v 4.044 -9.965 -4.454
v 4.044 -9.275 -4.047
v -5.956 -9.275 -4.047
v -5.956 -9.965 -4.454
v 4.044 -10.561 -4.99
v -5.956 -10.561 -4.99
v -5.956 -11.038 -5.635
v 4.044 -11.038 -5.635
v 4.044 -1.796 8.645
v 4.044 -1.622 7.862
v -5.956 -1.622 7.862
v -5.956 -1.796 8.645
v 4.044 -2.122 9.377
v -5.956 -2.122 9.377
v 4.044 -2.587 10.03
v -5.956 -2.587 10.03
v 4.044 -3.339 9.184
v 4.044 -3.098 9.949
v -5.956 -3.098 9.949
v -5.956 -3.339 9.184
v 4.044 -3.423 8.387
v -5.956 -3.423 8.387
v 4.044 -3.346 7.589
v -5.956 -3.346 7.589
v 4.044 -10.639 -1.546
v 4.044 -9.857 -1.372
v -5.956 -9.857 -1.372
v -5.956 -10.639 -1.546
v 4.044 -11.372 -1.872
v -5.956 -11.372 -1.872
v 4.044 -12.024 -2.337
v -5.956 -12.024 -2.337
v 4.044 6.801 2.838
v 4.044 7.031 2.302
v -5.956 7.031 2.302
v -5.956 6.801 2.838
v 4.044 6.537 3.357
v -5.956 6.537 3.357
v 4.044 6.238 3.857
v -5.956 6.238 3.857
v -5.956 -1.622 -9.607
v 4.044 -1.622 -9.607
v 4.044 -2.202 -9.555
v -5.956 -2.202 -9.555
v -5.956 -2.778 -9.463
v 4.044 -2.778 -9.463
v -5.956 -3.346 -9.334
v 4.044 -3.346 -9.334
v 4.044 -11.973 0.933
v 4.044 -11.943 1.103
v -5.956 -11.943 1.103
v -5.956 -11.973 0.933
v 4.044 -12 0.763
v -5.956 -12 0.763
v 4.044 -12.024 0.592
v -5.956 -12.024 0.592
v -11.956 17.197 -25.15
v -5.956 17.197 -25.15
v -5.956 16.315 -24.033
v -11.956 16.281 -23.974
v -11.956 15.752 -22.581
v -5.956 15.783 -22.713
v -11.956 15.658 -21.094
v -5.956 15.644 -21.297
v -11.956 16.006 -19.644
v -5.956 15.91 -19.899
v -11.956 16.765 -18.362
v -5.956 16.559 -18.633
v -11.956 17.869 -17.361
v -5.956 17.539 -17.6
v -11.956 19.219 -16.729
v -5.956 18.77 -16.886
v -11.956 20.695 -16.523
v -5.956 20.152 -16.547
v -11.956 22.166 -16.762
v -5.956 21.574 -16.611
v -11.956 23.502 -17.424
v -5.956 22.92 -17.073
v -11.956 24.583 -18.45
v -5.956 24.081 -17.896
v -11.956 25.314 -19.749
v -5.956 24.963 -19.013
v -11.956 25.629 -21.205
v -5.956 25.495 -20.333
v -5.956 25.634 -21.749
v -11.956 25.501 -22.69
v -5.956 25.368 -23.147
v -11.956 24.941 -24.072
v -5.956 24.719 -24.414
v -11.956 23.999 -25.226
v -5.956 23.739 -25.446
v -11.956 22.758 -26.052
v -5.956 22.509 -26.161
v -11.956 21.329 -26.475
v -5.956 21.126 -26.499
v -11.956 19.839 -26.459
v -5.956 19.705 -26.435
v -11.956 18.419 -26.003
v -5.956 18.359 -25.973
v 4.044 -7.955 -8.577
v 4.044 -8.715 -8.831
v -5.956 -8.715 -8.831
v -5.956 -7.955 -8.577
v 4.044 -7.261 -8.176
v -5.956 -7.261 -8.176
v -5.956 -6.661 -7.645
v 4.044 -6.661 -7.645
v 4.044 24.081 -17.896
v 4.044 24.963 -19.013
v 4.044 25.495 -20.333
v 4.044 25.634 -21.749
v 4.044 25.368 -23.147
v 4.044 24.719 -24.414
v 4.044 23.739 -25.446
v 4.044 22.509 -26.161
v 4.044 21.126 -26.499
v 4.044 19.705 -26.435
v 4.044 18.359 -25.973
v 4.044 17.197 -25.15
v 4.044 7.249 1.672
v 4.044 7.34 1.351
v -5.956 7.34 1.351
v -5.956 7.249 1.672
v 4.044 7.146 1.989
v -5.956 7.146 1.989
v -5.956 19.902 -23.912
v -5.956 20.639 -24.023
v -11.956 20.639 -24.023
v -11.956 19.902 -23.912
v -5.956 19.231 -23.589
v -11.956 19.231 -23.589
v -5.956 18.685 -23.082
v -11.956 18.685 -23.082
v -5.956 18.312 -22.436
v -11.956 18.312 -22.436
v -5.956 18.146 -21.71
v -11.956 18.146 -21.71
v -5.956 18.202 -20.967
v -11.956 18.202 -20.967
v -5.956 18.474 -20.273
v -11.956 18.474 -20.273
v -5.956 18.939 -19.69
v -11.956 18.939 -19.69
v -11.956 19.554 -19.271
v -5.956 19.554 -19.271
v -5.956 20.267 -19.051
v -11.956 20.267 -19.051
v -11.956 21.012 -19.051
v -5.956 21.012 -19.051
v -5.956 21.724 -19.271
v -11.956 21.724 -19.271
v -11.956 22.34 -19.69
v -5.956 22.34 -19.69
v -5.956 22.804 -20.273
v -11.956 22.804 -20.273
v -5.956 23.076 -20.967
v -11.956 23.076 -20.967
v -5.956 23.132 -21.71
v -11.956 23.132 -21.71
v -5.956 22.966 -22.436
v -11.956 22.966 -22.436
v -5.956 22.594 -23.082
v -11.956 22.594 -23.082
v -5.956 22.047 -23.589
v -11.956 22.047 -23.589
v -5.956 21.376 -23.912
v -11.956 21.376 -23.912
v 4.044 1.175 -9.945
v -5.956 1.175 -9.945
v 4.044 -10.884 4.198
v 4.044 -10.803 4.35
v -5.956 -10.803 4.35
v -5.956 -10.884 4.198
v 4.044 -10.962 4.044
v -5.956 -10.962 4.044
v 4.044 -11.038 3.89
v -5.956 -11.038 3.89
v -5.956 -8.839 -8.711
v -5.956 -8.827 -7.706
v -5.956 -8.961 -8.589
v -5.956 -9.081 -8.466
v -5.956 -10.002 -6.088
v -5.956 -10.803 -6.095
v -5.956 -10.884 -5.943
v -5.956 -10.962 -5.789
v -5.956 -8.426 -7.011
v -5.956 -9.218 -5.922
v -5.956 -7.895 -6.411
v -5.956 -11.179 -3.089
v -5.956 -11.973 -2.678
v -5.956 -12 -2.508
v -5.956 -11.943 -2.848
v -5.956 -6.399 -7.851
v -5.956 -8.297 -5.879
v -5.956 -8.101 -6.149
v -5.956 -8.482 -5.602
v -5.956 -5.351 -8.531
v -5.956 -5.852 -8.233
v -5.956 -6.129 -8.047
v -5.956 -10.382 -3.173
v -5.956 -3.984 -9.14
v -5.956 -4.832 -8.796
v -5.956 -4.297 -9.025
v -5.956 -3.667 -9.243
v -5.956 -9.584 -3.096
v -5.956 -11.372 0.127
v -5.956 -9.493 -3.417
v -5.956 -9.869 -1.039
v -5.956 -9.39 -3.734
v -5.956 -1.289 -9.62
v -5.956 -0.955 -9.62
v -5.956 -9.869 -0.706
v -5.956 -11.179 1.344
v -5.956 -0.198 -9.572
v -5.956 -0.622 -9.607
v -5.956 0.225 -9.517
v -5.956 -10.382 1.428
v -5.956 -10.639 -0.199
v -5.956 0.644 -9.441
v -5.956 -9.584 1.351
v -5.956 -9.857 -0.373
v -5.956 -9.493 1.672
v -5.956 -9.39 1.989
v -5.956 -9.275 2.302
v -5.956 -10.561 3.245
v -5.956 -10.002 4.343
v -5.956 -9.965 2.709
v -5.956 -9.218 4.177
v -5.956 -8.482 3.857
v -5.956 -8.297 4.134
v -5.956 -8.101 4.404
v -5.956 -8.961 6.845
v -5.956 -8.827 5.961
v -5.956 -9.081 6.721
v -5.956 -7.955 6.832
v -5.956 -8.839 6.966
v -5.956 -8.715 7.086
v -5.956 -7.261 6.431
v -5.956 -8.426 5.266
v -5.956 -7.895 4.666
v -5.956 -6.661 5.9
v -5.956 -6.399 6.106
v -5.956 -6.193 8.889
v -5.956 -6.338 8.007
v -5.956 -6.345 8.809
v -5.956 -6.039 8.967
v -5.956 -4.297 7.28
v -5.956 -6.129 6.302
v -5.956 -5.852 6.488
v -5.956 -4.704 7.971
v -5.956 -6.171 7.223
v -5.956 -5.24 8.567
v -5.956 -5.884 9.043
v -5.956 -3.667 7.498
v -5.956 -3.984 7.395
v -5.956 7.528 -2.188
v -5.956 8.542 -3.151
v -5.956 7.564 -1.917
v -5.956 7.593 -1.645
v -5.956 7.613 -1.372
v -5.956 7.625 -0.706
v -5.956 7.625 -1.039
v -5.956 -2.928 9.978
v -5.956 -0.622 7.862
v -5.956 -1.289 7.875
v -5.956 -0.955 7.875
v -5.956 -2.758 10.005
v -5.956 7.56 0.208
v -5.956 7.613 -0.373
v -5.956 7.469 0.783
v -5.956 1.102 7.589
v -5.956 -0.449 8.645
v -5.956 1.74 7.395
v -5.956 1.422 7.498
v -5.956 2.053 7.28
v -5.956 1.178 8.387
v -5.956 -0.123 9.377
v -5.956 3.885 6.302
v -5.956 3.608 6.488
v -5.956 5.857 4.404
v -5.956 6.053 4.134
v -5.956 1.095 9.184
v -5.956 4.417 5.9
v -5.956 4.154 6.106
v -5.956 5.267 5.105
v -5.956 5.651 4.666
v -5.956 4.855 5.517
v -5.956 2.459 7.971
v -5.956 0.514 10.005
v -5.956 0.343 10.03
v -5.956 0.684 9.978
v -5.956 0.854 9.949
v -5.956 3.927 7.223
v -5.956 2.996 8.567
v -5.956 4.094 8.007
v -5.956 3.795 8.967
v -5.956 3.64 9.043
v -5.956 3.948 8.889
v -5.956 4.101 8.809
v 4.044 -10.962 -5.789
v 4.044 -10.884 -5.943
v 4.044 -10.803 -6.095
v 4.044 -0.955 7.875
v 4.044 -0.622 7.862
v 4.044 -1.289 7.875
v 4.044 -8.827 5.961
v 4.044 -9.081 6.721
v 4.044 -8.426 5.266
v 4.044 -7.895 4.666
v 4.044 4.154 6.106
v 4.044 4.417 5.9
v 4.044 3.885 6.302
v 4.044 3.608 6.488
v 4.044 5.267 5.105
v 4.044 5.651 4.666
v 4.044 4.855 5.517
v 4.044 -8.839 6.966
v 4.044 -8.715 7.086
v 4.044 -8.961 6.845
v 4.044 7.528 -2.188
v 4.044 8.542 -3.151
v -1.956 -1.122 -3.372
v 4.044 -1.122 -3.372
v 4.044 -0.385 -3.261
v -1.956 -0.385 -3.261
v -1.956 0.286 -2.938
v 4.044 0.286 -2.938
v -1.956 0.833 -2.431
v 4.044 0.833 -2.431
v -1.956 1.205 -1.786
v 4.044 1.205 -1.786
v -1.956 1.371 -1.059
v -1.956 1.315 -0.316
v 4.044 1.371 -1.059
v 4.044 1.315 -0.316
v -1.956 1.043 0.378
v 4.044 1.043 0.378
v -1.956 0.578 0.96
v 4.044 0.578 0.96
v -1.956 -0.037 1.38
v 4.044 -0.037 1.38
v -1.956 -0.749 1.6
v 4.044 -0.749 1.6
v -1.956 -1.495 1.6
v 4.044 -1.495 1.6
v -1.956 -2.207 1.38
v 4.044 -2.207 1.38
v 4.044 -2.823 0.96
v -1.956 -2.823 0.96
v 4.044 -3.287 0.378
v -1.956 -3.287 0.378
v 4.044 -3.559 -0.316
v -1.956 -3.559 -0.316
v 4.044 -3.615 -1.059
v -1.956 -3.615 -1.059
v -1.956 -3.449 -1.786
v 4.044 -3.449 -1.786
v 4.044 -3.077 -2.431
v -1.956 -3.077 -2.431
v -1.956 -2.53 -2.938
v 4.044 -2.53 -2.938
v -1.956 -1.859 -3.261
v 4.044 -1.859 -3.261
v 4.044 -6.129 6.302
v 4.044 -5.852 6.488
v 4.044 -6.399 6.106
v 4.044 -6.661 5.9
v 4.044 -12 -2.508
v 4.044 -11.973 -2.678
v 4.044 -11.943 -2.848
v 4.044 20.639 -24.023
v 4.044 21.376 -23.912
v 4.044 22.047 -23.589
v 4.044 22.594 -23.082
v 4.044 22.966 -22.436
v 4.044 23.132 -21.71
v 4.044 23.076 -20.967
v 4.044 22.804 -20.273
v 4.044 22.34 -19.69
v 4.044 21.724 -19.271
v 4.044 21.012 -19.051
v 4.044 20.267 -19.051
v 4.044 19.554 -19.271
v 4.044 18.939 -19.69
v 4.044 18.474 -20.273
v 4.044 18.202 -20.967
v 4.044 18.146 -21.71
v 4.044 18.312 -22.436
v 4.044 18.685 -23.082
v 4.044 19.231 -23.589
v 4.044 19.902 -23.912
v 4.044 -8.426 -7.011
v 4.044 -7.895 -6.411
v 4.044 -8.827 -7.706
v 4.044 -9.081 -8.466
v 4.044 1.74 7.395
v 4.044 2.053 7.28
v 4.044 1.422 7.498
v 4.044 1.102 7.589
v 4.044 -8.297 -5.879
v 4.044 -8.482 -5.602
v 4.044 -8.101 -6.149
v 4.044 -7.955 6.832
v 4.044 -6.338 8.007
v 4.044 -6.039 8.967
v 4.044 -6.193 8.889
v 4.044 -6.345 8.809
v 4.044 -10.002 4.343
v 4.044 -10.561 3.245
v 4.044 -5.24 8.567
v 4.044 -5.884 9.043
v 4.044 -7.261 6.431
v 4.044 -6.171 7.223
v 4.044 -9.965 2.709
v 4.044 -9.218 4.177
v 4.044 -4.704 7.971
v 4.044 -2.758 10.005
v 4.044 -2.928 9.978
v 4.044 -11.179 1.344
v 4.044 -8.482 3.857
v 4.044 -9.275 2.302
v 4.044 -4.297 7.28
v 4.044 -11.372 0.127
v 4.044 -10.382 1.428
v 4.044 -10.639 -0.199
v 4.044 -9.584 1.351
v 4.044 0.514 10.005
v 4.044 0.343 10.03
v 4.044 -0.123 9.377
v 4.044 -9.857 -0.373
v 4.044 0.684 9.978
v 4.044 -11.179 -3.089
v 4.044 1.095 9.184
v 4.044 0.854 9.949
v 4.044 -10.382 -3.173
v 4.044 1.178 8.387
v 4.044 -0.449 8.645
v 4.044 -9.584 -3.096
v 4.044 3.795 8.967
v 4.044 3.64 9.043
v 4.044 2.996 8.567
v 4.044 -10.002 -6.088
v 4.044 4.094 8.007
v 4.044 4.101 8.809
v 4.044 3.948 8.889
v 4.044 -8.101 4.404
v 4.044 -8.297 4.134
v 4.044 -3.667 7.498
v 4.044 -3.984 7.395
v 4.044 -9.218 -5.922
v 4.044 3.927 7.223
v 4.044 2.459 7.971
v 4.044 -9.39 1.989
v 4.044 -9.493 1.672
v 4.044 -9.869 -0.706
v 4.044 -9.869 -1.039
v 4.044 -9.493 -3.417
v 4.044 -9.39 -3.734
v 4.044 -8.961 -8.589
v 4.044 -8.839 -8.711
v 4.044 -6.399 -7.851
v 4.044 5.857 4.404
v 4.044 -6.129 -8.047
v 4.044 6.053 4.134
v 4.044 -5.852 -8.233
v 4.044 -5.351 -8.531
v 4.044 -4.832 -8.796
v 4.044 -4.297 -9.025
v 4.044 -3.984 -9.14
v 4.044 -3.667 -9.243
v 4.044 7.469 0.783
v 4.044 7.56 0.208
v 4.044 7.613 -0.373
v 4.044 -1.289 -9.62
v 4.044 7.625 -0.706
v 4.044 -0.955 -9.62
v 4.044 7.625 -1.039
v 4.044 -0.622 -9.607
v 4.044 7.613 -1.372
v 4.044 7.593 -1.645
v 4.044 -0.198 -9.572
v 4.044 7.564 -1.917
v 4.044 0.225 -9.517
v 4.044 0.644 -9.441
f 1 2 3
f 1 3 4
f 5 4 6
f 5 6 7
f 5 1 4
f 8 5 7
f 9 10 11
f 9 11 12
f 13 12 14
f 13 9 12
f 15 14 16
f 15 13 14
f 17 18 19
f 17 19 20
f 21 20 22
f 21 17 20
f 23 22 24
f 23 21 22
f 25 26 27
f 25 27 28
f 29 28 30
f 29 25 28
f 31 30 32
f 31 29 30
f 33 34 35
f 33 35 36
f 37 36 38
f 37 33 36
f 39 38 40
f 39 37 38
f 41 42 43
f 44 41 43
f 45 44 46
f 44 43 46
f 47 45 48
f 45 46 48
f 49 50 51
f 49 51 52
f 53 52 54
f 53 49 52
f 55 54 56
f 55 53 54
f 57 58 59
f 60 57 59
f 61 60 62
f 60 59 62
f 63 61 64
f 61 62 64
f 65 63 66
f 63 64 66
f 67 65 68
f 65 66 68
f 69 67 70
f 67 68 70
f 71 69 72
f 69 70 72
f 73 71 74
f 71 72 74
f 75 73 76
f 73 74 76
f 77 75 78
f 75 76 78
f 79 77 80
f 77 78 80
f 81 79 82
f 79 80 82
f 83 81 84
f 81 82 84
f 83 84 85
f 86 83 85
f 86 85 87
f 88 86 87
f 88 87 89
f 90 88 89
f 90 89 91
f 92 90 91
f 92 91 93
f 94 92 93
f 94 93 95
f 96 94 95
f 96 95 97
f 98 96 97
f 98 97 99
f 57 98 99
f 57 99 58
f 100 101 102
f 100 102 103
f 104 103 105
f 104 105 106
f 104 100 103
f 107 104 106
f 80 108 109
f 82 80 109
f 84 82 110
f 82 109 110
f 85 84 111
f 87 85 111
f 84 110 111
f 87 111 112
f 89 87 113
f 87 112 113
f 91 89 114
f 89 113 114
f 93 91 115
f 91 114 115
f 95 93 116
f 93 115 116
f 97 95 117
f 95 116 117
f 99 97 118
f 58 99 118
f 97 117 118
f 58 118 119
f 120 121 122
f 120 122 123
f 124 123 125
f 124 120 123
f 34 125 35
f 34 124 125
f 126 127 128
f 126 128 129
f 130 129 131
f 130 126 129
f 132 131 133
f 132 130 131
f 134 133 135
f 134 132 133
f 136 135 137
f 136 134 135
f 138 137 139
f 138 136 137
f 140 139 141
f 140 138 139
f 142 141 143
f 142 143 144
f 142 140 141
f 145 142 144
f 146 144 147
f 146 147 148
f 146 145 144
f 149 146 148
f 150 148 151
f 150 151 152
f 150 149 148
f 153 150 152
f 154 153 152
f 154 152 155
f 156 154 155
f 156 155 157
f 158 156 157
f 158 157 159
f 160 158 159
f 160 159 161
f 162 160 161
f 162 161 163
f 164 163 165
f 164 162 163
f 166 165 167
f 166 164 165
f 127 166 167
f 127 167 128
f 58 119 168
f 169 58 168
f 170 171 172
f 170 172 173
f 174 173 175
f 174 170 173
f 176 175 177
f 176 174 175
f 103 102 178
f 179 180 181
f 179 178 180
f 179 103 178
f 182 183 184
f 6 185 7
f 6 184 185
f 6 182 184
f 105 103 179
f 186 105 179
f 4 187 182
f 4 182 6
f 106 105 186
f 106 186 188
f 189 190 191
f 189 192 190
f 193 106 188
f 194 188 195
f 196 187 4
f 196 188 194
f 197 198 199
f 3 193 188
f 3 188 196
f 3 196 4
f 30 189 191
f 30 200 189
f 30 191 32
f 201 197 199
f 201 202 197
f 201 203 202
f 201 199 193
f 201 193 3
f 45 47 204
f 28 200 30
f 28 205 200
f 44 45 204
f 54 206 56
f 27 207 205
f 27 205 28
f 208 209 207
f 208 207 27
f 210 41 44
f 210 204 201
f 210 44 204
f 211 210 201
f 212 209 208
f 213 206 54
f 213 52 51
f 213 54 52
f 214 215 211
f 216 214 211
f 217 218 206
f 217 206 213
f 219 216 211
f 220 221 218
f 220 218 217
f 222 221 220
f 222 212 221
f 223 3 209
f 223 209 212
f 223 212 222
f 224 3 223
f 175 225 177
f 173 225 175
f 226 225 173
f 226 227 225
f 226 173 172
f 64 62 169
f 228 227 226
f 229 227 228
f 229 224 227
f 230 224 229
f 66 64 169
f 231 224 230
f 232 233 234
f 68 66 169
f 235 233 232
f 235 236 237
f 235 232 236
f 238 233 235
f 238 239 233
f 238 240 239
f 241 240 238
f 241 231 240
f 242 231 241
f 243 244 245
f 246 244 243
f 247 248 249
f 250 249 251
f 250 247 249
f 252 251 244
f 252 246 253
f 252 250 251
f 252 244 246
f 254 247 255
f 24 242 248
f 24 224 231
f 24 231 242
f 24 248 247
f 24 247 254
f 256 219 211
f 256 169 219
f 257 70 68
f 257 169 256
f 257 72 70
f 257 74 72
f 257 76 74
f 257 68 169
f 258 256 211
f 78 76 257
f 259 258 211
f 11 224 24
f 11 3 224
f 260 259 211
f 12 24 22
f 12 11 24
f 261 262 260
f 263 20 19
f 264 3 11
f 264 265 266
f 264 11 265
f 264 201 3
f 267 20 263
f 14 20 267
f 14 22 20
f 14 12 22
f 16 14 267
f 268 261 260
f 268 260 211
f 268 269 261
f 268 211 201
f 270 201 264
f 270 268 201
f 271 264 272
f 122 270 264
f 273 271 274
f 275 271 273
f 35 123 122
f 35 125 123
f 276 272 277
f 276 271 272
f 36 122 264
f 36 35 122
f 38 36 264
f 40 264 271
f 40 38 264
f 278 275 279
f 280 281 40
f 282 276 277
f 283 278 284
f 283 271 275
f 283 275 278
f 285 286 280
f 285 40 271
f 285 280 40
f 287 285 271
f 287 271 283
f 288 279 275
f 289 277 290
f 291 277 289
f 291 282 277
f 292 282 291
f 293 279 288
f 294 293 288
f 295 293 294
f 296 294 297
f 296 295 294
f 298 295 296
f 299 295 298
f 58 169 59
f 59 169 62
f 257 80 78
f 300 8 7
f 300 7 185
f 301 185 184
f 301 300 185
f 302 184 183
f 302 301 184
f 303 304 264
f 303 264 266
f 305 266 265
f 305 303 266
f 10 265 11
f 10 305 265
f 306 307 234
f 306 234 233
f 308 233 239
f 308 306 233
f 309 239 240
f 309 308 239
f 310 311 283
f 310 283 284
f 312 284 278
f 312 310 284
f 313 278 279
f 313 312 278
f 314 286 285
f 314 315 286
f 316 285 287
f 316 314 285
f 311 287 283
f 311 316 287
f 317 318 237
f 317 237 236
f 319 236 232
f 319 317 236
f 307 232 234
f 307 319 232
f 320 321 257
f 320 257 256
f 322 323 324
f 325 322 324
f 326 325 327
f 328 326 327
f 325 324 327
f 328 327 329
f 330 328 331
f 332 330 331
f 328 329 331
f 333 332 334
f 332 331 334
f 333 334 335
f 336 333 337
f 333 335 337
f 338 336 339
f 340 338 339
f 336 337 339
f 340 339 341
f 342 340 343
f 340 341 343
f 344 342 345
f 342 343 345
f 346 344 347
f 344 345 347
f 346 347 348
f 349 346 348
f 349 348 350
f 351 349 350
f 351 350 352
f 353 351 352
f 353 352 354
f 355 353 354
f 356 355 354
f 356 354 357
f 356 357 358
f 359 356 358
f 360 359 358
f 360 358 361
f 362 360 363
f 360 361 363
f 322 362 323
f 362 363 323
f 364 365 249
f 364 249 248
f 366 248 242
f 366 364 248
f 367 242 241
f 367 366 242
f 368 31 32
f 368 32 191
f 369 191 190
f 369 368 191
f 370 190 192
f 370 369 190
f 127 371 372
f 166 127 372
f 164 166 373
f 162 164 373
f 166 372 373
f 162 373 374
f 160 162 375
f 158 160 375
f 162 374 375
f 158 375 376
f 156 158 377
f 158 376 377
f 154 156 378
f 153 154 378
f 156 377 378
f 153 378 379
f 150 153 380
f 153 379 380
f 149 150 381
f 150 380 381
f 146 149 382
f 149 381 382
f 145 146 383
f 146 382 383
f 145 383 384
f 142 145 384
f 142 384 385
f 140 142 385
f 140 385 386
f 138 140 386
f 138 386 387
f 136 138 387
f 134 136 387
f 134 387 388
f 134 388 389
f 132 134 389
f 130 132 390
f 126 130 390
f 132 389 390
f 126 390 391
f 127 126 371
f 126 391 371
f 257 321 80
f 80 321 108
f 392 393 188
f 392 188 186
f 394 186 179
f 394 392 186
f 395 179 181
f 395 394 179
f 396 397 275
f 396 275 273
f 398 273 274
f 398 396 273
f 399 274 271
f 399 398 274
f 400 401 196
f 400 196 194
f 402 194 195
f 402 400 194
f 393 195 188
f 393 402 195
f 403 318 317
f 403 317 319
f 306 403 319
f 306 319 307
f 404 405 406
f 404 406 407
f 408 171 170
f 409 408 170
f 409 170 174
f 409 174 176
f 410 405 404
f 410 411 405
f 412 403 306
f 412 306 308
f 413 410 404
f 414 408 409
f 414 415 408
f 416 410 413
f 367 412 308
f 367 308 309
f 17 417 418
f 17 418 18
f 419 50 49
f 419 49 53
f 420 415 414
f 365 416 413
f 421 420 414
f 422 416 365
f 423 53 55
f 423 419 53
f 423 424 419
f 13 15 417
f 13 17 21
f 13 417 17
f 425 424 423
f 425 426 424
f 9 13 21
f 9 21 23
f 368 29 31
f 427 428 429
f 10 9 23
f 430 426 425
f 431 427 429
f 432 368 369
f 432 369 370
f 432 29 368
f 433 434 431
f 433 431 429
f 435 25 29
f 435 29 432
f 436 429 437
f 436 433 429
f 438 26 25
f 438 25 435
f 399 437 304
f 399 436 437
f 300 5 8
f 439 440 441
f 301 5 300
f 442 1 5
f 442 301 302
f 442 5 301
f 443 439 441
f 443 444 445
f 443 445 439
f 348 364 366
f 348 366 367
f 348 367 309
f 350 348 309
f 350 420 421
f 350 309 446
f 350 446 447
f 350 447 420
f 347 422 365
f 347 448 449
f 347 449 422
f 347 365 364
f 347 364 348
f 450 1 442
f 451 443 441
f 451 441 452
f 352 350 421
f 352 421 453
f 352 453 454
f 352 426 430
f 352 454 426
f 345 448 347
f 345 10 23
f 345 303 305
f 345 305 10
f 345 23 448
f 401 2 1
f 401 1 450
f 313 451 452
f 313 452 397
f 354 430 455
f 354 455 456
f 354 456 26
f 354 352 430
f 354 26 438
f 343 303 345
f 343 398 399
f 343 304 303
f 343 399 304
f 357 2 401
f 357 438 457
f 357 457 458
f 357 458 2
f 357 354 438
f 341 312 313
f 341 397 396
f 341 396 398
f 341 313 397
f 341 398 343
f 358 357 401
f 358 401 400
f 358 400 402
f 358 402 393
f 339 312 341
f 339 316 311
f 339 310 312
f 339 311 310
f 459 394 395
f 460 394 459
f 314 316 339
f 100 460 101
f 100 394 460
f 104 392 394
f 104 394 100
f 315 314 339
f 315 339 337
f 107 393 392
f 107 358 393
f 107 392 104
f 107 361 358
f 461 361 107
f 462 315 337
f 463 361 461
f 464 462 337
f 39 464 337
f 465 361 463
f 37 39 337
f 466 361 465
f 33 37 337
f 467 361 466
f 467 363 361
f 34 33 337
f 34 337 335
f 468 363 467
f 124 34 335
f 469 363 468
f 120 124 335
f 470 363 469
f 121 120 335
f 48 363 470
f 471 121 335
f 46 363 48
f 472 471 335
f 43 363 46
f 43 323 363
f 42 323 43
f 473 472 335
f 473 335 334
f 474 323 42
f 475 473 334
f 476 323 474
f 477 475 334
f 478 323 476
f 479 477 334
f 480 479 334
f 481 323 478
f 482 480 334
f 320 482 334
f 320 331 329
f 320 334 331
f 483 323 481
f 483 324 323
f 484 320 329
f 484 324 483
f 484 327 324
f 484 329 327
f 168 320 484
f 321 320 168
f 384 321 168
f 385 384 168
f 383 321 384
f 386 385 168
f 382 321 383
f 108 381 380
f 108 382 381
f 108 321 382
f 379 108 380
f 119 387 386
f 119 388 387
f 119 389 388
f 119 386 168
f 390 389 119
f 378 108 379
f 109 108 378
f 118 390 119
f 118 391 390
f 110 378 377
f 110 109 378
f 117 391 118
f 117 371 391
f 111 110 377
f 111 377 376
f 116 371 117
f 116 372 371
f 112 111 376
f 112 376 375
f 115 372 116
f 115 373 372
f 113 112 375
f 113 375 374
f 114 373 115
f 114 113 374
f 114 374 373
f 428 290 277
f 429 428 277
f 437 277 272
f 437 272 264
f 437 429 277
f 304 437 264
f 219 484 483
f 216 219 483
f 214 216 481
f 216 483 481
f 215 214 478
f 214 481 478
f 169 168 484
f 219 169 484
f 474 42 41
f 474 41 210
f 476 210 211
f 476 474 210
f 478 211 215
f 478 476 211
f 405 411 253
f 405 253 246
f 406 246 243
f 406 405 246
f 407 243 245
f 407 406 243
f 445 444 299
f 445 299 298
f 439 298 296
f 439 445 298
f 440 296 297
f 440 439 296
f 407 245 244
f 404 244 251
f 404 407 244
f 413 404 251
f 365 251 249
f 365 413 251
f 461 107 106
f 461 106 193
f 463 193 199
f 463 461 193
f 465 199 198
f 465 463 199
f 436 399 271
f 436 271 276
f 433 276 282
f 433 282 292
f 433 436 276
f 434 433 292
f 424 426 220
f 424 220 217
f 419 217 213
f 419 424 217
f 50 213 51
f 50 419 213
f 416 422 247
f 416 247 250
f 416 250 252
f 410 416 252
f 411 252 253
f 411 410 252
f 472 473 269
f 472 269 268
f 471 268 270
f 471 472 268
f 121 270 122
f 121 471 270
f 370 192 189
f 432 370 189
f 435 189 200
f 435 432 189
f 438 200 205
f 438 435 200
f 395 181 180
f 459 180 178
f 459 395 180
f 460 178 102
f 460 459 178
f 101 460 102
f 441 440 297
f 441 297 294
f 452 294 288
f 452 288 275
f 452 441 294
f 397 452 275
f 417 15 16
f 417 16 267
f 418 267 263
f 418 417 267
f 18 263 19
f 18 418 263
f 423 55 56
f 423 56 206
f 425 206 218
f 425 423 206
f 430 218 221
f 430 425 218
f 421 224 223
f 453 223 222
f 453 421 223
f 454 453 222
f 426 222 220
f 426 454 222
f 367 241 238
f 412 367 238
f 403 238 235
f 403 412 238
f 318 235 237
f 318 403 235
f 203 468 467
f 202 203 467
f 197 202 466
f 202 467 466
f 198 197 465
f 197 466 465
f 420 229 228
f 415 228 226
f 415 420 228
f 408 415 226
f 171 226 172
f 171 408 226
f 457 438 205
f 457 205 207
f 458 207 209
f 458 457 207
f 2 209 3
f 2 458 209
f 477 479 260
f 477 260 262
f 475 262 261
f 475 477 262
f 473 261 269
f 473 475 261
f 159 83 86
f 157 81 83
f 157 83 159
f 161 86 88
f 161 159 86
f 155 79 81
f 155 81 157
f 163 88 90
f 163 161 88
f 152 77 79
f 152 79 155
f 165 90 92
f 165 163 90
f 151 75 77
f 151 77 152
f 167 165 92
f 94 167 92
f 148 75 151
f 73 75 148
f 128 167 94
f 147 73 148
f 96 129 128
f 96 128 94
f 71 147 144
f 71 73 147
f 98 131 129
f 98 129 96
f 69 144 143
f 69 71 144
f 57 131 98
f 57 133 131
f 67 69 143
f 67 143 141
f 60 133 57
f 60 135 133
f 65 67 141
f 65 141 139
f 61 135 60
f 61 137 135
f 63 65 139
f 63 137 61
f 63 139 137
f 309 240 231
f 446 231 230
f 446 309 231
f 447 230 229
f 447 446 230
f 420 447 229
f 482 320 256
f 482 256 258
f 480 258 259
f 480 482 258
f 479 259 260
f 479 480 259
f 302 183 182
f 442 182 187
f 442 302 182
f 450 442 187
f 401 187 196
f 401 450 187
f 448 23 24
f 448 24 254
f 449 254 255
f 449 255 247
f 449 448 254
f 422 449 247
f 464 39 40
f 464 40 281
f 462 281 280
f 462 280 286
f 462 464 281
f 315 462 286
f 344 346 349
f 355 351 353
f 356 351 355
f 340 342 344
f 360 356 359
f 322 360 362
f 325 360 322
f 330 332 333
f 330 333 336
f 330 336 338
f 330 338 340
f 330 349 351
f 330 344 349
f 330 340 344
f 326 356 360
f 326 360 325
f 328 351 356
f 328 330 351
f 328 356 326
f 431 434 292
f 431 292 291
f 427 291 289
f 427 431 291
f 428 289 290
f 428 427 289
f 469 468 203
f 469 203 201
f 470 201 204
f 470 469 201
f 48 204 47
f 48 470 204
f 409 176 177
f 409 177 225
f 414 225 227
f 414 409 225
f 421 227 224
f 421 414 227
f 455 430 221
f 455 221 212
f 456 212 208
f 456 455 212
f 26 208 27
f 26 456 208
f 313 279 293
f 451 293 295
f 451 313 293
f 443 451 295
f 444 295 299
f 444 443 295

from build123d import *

# Parameters (mm, degrees)
SKETCH1_R           = 2.5
BOSS_EXTRUDE1_DEPTH = 10
SKETCH2_R           = 2.5
BOSS_EXTRUDE2_DEPTH = 10
SKETCH3_R           = 5
SKETCH3_R_2         = 2.5
BOSS_EXTRUDE3_DEPTH = 6
SKETCH4_R           = 2.5
CUT_EXTRUDE1_DEPTH  = 6
CUT_EXTRUDE2_DEPTH  = 41.209967862


with BuildPart() as part:
    # Sketch1 → Boss-Extrude1 (new body)
    with BuildSketch(Plane(origin=(4.043870029, 0, 0), x_dir=(0, 0, -1), z_dir=(1, 0, 0))):
        with BuildLine():
            ThreePointArc((-10.029541992, 0.342879069), (-9.019080639, -0.304016541), (-7.862233613, -0.622153359))
            ThreePointArc((-7.862233613, -0.622153359), (-7.876528296, -1.122077366), (-7.862233613, -1.622001374))
            ThreePointArc((-7.862233613, -1.622001374), (-9.019080639, -1.940138191), (-10.029541992, -2.587033801))
            ThreePointArc((-10.029541992, -2.587033801), (-9.992100042, -2.842856482), (-9.948655897, -3.097728508))
            ThreePointArc((-9.948655897, -3.097728508), (-8.787748306, -3.400713063), (-7.58921172, -3.345793765))
            ThreePointArc((-7.58921172, -3.345793765), (-7.448321757, -3.82566705), (-7.280241692, -4.296705735))
            ThreePointArc((-7.280241692, -4.296705735), (-8.282158911, -4.956757219), (-9.043263028, -5.884241235))
            ThreePointArc((-9.043263028, -5.884241235), (-8.928600062, -6.115972863), (-8.808522437, -6.344945585))
            ThreePointArc((-8.808522437, -6.344945585), (-7.610806331, -6.274360846), (-6.487901298, -5.851761317))
            ThreePointArc((-6.487901298, -5.851761317), (-6.20561798, -6.264610538), (-5.90020538, -6.660655353))
            ThreePointArc((-5.90020538, -6.660655353), (-6.649118154, -7.598011066), (-7.086362862, -8.715294889))
            ThreePointArc((-7.086362862, -8.715294889), (-6.905702889, -8.900251959), (-6.720745819, -9.080911932))
            ThreePointArc((-6.720745819, -9.080911932), (-5.603461996, -8.643667224), (-4.666106283, -7.89475445))
            ThreePointArc((-4.666106283, -7.89475445), (-4.270061468, -8.20016705), (-3.857212247, -8.482450368))
            ThreePointArc((-3.857212247, -8.482450368), (-4.279811776, -9.605355401), (-4.350396515, -10.803071507))
            ThreePointArc((-4.350396515, -10.803071507), (-4.121423793, -10.923149132), (-3.889692165, -11.037812099))
            ThreePointArc((-3.889692165, -11.037812099), (-2.962208149, -10.276707981), (-2.302156665, -9.274790762))
            ThreePointArc((-2.302156665, -9.274790762), (-1.83111798, -9.442870827), (-1.351244695, -9.583760791))
            ThreePointArc((-1.351244695, -9.583760791), (-1.406163992, -10.782297376), (-1.103179437, -11.943204968))
            ThreePointArc((-1.103179437, -11.943204968), (-0.848307411, -11.986649113), (-0.592484731, -12.024091063))
            ThreePointArc((-0.592484731, -12.024091063), (0.054410879, -11.01362971), (0.372547697, -9.856782684))
            ThreePointArc((0.372547697, -9.856782684), (0.872471704, -9.871077366), (1.372395712, -9.856782684))
            ThreePointArc((1.372395712, -9.856782684), (1.690532529, -11.01362971), (2.337428139, -12.024091063))
            ThreePointArc((2.337428139, -12.024091063), (2.59325082, -11.986649113), (2.848122846, -11.943204968))
            ThreePointArc((2.848122846, -11.943204968), (3.151107401, -10.782297376), (3.096188103, -9.583760791))
            ThreePointArc((3.096188103, -9.583760791), (3.576061388, -9.442870827), (4.047100073, -9.274790762))
            ThreePointArc((4.047100073, -9.274790762), (4.707151558, -10.276707981), (5.634635573, -11.037812099))
            ThreePointArc((5.634635573, -11.037812099), (5.866367201, -10.923149132), (6.095339923, -10.803071507))
            ThreePointArc((6.095339923, -10.803071507), (6.024755184, -9.605355401), (5.602155655, -8.482450368))
            ThreePointArc((5.602155655, -8.482450368), (6.015004877, -8.20016705), (6.411049691, -7.89475445))
            ThreePointArc((6.411049691, -7.89475445), (7.348405404, -8.643667224), (8.465689227, -9.080911932))
            ThreePointArc((8.465689227, -9.080911932), (8.650646297, -8.900251959), (8.83130627, -8.715294889))
            ThreePointArc((8.83130627, -8.715294889), (8.394061563, -7.598011066), (7.645148788, -6.660655353))
            ThreePointArc((7.645148788, -6.660655353), (7.950561388, -6.264610538), (8.232844706, -5.851761317))
            ThreePointArc((8.232844706, -5.851761317), (9.355749739, -6.274360846), (10.553465846, -6.344945585))
            ThreePointArc((10.553465846, -6.344945585), (10.67354347, -6.115972863), (10.788206437, -5.884241235))
            ThreePointArc((10.788206437, -5.884241235), (10.02710232, -4.956757219), (9.0251851, -4.296705735))
            ThreePointArc((9.0251851, -4.296705735), (9.193265165, -3.82566705), (9.334155129, -3.345793765))
            ThreePointArc((9.334155129, -3.345793765), (10.532691714, -3.400713063), (11.693599306, -3.097728508))
            ThreePointArc((11.693599306, -3.097728508), (11.737043451, -2.842856482), (11.774485401, -2.587033801))
            ThreePointArc((11.774485401, -2.587033801), (10.764024048, -1.940138191), (9.607177022, -1.622001374))
            ThreePointArc((9.607177022, -1.622001374), (9.621471704, -1.122077366), (9.607177022, -0.622153359))
            ThreePointArc((9.607177022, -0.622153359), (10.764024048, -0.304016541), (11.774485401, 0.342879069))
            ThreePointArc((11.774485401, 0.342879069), (11.737043451, 0.598701749), (11.693599306, 0.853573775))
            ThreePointArc((11.693599306, 0.853573775), (10.532691714, 1.156558331), (9.334155129, 1.101639033))
            ThreePointArc((9.334155129, 1.101639033), (9.193265165, 1.581512318), (9.0251851, 2.052551003))
            ThreePointArc((9.0251851, 2.052551003), (10.02710232, 2.712602487), (10.788206437, 3.640086503))
            ThreePointArc((10.788206437, 3.640086503), (10.67354347, 3.871818131), (10.553465846, 4.100790853))
            ThreePointArc((10.553465846, 4.100790853), (9.355749739, 4.030206114), (8.232844706, 3.607606585))
            ThreePointArc((8.232844706, 3.607606585), (7.950561388, 4.020455806), (7.645148788, 4.416500621))
            ThreePointArc((7.645148788, 4.416500621), (8.394061563, 5.353856334), (8.83130627, 6.471140157))
            ThreePointArc((8.83130627, 6.471140157), (8.650646297, 6.656097227), (8.465689227, 6.8367572))
            ThreePointArc((8.465689227, 6.8367572), (7.348405404, 6.399512492), (6.411049691, 5.650599718))
            ThreePointArc((6.411049691, 5.650599718), (6.015004877, 5.956012318), (5.602155655, 6.238295636))
            ThreePointArc((5.602155655, 6.238295636), (6.024755184, 7.361200669), (6.095339923, 8.558916775))
            ThreePointArc((6.095339923, 8.558916775), (5.866367201, 8.6789944), (5.634635573, 8.793657366))
            ThreePointArc((5.634635573, 8.793657366), (4.707151558, 8.032553249), (4.047100073, 7.03063603))
            ThreePointArc((4.047100073, 7.03063603), (3.576061388, 7.198716095), (3.096188103, 7.339606058))
            ThreePointArc((3.096188103, 7.339606058), (3.151107401, 8.538142644), (2.848122846, 9.699050235))
            ThreePointArc((2.848122846, 9.699050235), (2.59325082, 9.74249438), (2.337428139, 9.779936331))
            ThreePointArc((2.337428139, 9.779936331), (1.690532529, 8.769474978), (1.372395712, 7.612627952))
            ThreePointArc((1.372395712, 7.612627952), (0.872471704, 7.626922634), (0.372547697, 7.612627952))
            ThreePointArc((0.372547697, 7.612627952), (0.054410879, 8.769474978), (-0.592484731, 9.779936331))
            ThreePointArc((-0.592484731, 9.779936331), (-0.848307411, 9.74249438), (-1.103179437, 9.699050235))
            ThreePointArc((-1.103179437, 9.699050235), (-1.406163992, 8.538142644), (-1.351244695, 7.339606058))
            ThreePointArc((-1.351244695, 7.339606058), (-1.83111798, 7.198716095), (-2.302156665, 7.03063603))
            ThreePointArc((-2.302156665, 7.03063603), (-2.962208149, 8.032553249), (-3.889692165, 8.793657366))
            ThreePointArc((-3.889692165, 8.793657366), (-4.121423793, 8.6789944), (-4.350396515, 8.558916775))
            ThreePointArc((-4.350396515, 8.558916775), (-4.279811776, 7.361200669), (-3.857212247, 6.238295636))
            ThreePointArc((-3.857212247, 6.238295636), (-4.270061468, 5.956012318), (-4.666106283, 5.650599718))
            ThreePointArc((-4.666106283, 5.650599718), (-5.603461996, 6.399512492), (-6.720745819, 6.8367572))
            ThreePointArc((-6.720745819, 6.8367572), (-6.905702889, 6.656097227), (-7.086362862, 6.471140157))
            ThreePointArc((-7.086362862, 6.471140157), (-6.649118154, 5.353856334), (-5.90020538, 4.416500621))
            ThreePointArc((-5.90020538, 4.416500621), (-6.20561798, 4.020455806), (-6.487901298, 3.607606585))
            ThreePointArc((-6.487901298, 3.607606585), (-7.610806331, 4.030206114), (-8.808522437, 4.100790853))
            ThreePointArc((-8.808522437, 4.100790853), (-8.928600062, 3.871818131), (-9.043263028, 3.640086503))
            ThreePointArc((-9.043263028, 3.640086503), (-8.282158911, 2.712602487), (-7.280241692, 2.052551003))
            ThreePointArc((-7.280241692, 2.052551003), (-7.448321757, 1.581512318), (-7.58921172, 1.101639033))
            ThreePointArc((-7.58921172, 1.101639033), (-8.787748306, 1.156558331), (-9.948655897, 0.853573775))
            ThreePointArc((-9.948655897, 0.853573775), (-9.992100042, 0.598701749), (-10.029541992, 0.342879069))
        make_face()
        with Locations(Location((0.872471704, -1.122077366, 0), (0, 0, 180))):
            Circle(SKETCH1_R, mode=Mode.SUBTRACT)
    extrude(amount=-BOSS_EXTRUDE1_DEPTH)

    # Sketch2 → Boss-Extrude2 (add)
    with BuildSketch(Plane(origin=(4.043870029, 0, 0), x_dir=(0, 0, -1), z_dir=(1, 0, 0))):
        with BuildLine():
            Line((-2.754400151, 2.319695512), (17.89623712, 24.080926643))
            ThreePointArc((17.89623712, 24.080926643), (24.964881853, 24.266025619), (25.14998083, 17.197380886))
            Line((25.14998083, 17.197380886), (4.499343559, -4.563850245))
            ThreePointArc((4.499343559, -4.563850245), (-2.569301174, -4.748949221), (-2.754400151, 2.319695512))
        make_face()
        with Locations((21.523108975, 20.639153764)):
            Circle(SKETCH2_R, mode=Mode.SUBTRACT)
    extrude(amount=-BOSS_EXTRUDE2_DEPTH)

    # Sketch3 → Boss-Extrude3 (add)
    with BuildSketch(Plane.ZY.offset(5.956129971)):
        with Locations(Location((-21.523108975, 20.639153764, 0), (0, 0, 223.5))):
            Circle(SKETCH3_R)
        with Locations(Location((-21.523108975, 20.639153764, 0), (0, 0, 180))):
            Circle(SKETCH3_R_2, mode=Mode.SUBTRACT)
    extrude(amount=BOSS_EXTRUDE3_DEPTH)

    # Sketch4 → Cut-Extrude1 (cut)
    with BuildSketch(Plane(origin=(4.043870029, 0, 0), x_dir=(0, 0, -1), z_dir=(1, 0, 0))):
        with Locations((0.872471704, -1.122077366)):
            Circle(SKETCH4_R)
    extrude(amount=-CUT_EXTRUDE1_DEPTH, mode=Mode.SUBTRACT)

    # Sketch6 → Cut-Extrude2 (cut, through all)
    with BuildSketch(Plane(origin=(4.043870029, 0, 0), x_dir=(0, 0, -1), z_dir=(1, 0, 0))):
        with BuildLine():
            Line((4.579688985, 10.048212881), (2.187631015, 7.527509733))
            ThreePointArc((2.187631015, 7.527509733), (-2.46576826, 6.965020688), (-6.16100093, 4.08131227))
            Line((-6.16100093, 4.08131227), (-8.58915512, 5.877669916))
            ThreePointArc((-8.58915512, 5.877669916), (-2.68093011, 10.098091069), (4.579688985, 10.048212881))
        make_face()
        with BuildLine():
            Line((11.833432695, 3.164667124), (9.441374725, 0.643963976))
            ThreePointArc((9.441374725, 0.643963976), (9.424184018, -2.969566881), (7.948146758, -6.267932352))
            Line((7.948146758, -6.267932352), (10.39087042, -8.044427405))
            ThreePointArc((10.39087042, -8.044427405), (12.54560297, -2.624359175), (11.833432695, 3.164667124))
        make_face()
    extrude(amount=-CUT_EXTRUDE2_DEPTH, mode=Mode.SUBTRACT)


solid = part.part
